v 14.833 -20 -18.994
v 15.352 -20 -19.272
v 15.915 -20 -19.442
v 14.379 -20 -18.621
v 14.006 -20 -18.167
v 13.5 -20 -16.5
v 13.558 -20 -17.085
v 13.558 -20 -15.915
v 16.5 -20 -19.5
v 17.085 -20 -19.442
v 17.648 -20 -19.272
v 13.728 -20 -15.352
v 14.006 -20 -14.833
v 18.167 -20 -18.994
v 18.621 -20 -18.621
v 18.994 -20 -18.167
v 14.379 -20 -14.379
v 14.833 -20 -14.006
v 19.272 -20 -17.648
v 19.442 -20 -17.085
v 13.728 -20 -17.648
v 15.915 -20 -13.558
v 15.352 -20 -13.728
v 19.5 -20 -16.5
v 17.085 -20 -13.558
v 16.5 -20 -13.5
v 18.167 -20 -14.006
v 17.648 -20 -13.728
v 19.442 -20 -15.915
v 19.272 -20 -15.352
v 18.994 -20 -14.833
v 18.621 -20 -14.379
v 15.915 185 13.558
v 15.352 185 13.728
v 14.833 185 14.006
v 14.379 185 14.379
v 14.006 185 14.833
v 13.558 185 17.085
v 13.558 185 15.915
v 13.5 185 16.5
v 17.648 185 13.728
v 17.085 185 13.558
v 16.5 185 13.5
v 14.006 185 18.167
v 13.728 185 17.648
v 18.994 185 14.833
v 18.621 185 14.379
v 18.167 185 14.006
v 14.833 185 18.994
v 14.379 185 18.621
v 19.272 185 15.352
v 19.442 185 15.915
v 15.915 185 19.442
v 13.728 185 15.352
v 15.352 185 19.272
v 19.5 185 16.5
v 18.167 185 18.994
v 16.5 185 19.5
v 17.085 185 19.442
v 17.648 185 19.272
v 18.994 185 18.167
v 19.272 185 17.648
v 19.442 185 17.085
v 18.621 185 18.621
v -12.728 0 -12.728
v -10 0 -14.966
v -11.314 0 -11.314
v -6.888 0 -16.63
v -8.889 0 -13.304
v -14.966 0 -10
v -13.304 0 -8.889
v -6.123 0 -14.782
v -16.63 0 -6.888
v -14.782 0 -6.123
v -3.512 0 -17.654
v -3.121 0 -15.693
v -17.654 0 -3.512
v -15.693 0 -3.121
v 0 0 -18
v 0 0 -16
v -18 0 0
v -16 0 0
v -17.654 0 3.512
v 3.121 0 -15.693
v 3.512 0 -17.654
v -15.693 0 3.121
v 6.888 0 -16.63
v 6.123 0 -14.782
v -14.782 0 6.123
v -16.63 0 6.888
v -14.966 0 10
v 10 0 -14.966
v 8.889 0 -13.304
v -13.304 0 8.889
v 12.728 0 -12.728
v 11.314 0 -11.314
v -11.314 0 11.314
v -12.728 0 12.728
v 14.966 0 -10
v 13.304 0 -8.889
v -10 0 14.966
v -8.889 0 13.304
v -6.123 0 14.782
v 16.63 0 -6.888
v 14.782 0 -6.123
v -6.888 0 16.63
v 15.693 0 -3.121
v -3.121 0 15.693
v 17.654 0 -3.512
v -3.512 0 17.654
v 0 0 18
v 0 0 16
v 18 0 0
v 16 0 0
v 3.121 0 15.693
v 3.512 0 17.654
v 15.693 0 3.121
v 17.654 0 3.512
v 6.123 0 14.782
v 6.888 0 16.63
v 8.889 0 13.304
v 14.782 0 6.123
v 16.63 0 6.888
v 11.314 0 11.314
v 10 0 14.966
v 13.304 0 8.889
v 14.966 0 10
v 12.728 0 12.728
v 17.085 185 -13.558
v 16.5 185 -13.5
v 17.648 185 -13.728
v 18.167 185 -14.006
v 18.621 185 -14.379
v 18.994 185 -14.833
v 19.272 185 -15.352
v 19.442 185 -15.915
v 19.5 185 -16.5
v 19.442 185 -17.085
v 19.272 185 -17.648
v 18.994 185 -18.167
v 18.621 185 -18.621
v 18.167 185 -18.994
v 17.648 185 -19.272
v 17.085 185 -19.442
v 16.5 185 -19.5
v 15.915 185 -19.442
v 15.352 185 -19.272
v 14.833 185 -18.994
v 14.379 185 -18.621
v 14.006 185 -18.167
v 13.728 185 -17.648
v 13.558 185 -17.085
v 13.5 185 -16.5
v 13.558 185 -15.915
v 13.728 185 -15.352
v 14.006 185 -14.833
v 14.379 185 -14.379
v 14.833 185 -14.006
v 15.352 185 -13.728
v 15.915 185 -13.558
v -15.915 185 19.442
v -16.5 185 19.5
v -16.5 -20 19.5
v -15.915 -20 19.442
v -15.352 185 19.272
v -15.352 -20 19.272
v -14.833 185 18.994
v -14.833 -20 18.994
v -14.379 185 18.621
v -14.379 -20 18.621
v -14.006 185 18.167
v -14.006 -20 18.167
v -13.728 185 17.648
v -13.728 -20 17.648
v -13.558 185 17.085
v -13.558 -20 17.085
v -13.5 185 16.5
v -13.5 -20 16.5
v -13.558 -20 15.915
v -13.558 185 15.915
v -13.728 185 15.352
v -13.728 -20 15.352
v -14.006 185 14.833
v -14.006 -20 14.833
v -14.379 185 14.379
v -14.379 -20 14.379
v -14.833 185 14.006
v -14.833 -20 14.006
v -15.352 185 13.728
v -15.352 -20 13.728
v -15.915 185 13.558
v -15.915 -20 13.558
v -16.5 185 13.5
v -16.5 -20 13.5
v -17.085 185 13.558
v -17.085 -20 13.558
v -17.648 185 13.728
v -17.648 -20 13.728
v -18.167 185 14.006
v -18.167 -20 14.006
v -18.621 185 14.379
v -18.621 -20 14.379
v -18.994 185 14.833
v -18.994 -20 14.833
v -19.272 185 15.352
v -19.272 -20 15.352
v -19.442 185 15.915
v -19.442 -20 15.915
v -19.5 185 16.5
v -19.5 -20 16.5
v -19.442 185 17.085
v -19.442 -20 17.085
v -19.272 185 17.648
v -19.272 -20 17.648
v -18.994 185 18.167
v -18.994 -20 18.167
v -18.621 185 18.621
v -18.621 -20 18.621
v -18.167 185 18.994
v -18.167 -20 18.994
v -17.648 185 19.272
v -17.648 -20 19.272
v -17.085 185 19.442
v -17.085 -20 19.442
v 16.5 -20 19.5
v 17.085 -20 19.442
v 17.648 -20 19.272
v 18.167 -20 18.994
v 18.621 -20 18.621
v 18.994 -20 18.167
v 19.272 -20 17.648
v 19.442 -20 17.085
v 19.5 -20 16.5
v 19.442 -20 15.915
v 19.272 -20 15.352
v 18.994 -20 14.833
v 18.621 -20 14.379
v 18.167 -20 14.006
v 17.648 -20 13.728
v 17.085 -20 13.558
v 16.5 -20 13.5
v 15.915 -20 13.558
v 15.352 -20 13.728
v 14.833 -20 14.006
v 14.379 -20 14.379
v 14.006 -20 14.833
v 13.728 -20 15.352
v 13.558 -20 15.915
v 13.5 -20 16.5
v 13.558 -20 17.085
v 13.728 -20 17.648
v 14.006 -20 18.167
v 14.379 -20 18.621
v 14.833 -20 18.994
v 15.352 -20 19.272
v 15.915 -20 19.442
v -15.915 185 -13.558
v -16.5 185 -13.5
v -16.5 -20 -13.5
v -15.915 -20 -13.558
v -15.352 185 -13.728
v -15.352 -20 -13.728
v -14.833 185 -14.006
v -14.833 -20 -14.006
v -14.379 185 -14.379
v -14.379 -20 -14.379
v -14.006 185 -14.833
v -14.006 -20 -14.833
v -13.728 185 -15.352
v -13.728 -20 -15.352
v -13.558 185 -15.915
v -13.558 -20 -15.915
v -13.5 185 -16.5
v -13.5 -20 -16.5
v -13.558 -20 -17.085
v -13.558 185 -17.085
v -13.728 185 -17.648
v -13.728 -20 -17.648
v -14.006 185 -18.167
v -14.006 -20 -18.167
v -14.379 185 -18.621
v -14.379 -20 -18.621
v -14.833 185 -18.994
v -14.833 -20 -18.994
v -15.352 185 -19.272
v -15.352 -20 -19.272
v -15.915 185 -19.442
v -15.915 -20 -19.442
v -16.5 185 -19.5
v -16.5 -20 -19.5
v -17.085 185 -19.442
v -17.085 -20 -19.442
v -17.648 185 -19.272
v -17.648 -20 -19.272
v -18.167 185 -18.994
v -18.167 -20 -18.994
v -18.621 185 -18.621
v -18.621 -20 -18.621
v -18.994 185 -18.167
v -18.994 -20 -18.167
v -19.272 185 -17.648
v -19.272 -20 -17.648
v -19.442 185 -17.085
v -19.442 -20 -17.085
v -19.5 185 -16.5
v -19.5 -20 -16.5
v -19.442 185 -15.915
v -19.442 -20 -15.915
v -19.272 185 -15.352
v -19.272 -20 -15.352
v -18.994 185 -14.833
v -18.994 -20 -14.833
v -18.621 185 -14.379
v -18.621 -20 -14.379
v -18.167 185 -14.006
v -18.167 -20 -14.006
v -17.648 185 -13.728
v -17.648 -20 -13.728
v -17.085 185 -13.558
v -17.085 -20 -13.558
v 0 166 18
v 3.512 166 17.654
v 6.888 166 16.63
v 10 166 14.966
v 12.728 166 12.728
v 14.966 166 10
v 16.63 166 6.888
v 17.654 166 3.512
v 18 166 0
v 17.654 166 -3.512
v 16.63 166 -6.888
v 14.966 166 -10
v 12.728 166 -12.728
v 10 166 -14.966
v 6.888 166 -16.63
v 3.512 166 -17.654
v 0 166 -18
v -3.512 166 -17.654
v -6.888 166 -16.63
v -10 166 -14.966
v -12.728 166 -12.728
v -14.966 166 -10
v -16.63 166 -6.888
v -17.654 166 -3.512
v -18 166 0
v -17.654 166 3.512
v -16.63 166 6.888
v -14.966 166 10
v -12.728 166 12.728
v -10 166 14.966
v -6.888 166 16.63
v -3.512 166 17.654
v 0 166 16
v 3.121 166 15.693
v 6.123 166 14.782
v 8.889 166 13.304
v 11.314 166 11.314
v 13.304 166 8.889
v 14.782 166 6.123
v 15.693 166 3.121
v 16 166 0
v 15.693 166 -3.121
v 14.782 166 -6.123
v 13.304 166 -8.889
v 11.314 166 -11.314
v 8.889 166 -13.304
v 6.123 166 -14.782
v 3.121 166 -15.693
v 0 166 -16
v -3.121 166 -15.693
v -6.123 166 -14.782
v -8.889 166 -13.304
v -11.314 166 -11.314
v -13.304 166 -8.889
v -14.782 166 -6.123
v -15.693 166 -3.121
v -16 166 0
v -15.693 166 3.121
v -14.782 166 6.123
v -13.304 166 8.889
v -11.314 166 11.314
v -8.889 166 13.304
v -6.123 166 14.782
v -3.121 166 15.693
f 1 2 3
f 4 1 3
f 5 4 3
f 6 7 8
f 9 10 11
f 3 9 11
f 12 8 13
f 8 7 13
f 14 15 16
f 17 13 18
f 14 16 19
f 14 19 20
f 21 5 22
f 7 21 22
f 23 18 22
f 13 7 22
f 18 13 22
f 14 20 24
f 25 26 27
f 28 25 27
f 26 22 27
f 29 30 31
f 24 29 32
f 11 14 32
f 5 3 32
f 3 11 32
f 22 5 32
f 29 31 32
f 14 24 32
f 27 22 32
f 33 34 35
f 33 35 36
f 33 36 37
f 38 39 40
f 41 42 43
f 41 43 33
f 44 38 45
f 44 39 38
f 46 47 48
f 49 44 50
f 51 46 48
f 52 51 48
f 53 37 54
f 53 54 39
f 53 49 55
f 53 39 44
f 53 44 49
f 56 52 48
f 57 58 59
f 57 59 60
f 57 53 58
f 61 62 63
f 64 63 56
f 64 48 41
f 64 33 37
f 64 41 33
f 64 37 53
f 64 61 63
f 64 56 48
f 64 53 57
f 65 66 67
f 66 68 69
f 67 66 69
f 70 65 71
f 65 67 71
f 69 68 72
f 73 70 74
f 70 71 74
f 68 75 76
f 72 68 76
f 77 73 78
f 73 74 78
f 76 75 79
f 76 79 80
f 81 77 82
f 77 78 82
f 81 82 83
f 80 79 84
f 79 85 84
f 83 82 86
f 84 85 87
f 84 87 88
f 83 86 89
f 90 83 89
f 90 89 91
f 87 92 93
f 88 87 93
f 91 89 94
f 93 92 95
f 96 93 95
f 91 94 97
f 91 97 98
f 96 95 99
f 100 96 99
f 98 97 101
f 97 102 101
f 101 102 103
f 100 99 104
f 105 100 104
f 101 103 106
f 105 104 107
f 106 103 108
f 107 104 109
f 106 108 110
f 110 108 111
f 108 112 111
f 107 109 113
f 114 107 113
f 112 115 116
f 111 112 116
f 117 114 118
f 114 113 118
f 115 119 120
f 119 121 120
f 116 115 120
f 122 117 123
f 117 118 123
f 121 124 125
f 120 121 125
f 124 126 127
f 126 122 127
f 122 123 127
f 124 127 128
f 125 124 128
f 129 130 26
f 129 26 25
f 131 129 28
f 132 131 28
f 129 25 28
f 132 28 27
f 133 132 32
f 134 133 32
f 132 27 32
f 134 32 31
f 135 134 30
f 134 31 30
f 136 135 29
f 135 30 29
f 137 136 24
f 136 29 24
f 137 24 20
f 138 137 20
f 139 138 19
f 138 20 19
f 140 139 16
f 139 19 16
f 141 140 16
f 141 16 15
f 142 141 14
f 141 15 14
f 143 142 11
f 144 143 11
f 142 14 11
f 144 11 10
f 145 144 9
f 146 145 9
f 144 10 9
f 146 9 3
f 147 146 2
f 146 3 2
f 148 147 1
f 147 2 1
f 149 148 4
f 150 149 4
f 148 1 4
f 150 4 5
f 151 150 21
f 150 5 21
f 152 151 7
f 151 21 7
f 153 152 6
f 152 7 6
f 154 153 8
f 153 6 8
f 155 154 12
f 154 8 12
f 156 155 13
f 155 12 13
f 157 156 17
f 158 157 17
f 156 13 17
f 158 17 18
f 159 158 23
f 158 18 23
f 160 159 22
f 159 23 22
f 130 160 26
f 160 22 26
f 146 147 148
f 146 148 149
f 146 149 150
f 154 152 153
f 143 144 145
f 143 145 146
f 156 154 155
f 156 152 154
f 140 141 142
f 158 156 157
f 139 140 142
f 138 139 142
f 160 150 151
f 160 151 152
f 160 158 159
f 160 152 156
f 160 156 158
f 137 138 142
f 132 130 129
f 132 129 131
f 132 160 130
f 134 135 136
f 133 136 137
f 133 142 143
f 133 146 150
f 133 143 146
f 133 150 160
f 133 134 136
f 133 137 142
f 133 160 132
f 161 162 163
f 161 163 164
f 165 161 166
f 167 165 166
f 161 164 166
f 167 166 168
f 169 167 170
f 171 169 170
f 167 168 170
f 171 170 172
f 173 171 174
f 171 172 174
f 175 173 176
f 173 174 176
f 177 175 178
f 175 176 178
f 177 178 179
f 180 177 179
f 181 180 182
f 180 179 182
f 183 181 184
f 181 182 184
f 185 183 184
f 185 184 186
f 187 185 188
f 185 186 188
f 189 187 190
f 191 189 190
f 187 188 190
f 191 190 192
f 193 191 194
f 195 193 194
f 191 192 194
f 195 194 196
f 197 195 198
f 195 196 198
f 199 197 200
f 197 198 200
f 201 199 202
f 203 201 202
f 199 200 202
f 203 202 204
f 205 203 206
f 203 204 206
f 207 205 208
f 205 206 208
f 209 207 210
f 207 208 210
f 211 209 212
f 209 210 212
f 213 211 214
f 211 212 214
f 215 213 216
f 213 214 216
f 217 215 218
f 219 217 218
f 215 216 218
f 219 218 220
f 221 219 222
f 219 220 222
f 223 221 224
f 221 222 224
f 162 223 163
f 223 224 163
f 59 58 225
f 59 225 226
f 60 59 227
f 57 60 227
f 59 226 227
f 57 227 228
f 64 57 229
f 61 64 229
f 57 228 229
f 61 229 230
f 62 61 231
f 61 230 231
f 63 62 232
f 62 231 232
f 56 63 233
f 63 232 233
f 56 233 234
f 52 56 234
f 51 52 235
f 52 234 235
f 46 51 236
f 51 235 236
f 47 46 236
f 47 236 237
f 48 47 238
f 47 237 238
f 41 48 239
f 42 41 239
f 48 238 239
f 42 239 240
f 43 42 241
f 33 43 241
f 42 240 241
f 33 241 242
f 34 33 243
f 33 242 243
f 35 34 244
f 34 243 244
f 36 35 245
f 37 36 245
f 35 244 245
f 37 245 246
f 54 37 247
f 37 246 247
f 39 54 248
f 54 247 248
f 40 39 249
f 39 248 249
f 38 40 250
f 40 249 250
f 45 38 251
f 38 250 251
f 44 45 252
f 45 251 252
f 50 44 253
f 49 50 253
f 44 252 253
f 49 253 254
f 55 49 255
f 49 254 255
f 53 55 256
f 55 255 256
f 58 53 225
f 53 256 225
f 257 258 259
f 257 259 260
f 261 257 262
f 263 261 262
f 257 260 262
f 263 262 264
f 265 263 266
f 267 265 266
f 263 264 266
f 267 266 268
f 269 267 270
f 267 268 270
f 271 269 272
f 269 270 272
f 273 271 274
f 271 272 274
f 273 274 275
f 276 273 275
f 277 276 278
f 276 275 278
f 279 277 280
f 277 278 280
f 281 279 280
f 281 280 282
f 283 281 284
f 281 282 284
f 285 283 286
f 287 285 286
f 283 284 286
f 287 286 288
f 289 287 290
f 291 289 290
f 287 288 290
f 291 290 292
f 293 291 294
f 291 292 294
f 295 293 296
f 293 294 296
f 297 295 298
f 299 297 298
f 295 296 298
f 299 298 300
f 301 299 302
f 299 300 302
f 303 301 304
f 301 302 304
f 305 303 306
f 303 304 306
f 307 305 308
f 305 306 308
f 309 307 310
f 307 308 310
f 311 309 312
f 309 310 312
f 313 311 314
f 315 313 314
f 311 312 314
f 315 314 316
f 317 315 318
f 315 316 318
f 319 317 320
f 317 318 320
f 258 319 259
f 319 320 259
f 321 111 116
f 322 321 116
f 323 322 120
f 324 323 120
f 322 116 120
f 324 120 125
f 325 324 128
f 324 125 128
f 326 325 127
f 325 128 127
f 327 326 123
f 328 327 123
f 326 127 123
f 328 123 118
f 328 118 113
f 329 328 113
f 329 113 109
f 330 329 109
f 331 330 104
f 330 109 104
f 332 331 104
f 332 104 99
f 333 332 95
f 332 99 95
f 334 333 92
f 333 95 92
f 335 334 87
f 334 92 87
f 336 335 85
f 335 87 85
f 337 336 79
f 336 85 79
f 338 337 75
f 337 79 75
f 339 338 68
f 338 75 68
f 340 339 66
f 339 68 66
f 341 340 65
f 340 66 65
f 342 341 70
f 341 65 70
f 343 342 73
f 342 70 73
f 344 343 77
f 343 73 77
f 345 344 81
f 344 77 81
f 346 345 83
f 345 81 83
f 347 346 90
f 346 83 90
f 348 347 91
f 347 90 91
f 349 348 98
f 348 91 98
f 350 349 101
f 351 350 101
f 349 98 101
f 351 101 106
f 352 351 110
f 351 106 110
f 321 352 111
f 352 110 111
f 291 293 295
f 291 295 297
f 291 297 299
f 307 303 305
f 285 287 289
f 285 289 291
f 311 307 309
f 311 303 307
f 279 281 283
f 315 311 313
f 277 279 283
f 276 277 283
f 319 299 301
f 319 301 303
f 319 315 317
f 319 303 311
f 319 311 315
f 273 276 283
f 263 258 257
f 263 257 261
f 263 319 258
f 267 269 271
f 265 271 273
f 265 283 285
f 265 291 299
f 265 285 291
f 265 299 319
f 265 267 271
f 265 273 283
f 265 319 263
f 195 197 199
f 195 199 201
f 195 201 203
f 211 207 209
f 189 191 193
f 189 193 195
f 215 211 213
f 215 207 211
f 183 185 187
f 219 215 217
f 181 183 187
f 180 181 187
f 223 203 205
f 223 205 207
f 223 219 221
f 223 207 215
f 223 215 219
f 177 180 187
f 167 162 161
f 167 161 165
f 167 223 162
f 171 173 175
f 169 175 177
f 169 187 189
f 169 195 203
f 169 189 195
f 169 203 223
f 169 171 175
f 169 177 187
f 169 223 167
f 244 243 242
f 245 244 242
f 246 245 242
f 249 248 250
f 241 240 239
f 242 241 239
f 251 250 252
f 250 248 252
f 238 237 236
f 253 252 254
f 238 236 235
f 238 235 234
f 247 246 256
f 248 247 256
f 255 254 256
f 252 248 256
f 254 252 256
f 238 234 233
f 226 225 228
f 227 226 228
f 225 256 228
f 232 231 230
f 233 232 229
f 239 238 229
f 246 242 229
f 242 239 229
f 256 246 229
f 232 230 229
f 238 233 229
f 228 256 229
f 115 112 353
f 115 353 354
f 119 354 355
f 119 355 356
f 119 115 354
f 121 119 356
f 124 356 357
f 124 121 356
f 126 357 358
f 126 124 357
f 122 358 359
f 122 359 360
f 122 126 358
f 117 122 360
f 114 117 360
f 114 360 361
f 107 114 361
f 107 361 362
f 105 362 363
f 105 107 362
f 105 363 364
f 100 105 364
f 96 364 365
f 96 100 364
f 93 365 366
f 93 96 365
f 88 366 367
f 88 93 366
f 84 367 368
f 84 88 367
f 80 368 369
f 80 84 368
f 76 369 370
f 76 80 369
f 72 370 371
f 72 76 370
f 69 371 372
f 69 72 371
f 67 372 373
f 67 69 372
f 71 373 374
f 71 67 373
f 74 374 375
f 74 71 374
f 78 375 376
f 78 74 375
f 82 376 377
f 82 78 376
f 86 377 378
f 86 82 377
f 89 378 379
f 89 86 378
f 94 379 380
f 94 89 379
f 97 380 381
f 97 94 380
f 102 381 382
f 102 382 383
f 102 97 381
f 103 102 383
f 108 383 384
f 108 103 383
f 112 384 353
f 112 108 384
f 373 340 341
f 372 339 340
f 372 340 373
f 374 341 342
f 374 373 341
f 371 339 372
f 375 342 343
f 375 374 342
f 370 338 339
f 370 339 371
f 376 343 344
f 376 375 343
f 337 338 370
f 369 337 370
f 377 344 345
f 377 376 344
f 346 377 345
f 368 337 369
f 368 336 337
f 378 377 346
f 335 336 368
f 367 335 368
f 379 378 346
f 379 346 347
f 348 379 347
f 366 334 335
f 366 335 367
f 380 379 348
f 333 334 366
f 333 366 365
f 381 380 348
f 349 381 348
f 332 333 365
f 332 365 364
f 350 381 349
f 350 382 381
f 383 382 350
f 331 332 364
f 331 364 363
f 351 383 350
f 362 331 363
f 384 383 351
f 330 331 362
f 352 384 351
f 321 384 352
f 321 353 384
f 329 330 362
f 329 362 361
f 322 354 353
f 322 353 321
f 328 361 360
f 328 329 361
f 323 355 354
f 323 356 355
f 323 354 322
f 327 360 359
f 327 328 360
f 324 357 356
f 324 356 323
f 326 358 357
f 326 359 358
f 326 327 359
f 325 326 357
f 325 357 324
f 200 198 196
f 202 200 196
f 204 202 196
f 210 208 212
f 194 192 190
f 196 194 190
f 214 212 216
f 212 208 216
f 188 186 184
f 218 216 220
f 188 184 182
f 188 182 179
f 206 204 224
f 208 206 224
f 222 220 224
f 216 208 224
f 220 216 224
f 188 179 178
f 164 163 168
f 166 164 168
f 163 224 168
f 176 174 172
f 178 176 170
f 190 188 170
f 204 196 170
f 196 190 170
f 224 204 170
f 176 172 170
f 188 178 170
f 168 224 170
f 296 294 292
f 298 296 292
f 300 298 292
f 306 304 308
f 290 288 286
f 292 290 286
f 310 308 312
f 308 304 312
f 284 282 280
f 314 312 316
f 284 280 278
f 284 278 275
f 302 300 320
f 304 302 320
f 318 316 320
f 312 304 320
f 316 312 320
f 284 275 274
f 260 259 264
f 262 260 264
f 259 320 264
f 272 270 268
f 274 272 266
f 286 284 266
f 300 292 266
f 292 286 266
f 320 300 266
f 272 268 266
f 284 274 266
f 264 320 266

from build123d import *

# Parameters (mm, degrees)
SKETCH1_R                  = 18
SKETCH1_R_2                = 16
BOSS_EXTRUDE1_DEPTH        = 166
BOSS_EXTRUDE2_DEPTH        = 185
BOSS_EXTRUDE2_DEPTH_BACK   = 20
SKETCH2_R                  = 3
BOSS_EXTRUDE2_2_DEPTH      = 185
BOSS_EXTRUDE2_2_DEPTH_BACK = 20
BOSS_EXTRUDE2_3_DEPTH      = 185
BOSS_EXTRUDE2_3_DEPTH_BACK = 20
BOSS_EXTRUDE2_4_DEPTH      = 185
BOSS_EXTRUDE2_4_DEPTH_BACK = 20


with BuildPart() as part:
    # Sketch1 → Boss-Extrude1 (new body)
    with BuildSketch(Plane(origin=(0, 0, 0), x_dir=(1, 0, 0), z_dir=(0, 1, 0))):
        with Locations(Location((0, 0, 0), (0, 0, 270))):
            Circle(SKETCH1_R)
        with Locations(Location((0, 0, 0), (0, 0, 270))):
            Circle(SKETCH1_R_2, mode=Mode.SUBTRACT)
    extrude(amount=BOSS_EXTRUDE1_DEPTH)


with BuildPart() as body_2:
    # Sketch2 → Boss-Extrude2 (new, two sides: drawn at the far end of the back side and taken through both)
    with BuildSketch(Plane(origin=(0, 0, 0), x_dir=(1, 0, 0), z_dir=(0, 1, 0)).offset(-BOSS_EXTRUDE2_DEPTH_BACK)):
        with Locations(Location((-16.5, 16.5, 0), (0, 0, 270))):
            Circle(SKETCH2_R)
    extrude(amount=BOSS_EXTRUDE2_DEPTH + BOSS_EXTRUDE2_DEPTH_BACK)


with BuildPart() as body_3:
    # Sketch2 → Boss-Extrude2 2 (new, two sides: drawn at the far end of the back side and taken through both)
    with BuildSketch(Plane(origin=(0, 0, 0), x_dir=(1, 0, 0), z_dir=(0, 1, 0)).offset(-BOSS_EXTRUDE2_2_DEPTH_BACK)):
        with Locations(Location((16.5, 16.5, 0), (0, 0, 270))):
            Circle(SKETCH2_R)
    extrude(amount=BOSS_EXTRUDE2_2_DEPTH + BOSS_EXTRUDE2_2_DEPTH_BACK)


with BuildPart() as body_4:
    # Sketch2 → Boss-Extrude2 3 (new, two sides: drawn at the far end of the back side and taken through both)
    with BuildSketch(Plane(origin=(0, 0, 0), x_dir=(1, 0, 0), z_dir=(0, 1, 0)).offset(-BOSS_EXTRUDE2_3_DEPTH_BACK)):
        with Locations(Location((16.5, -16.5, 0), (0, 0, 270))):
            Circle(SKETCH2_R)
    extrude(amount=BOSS_EXTRUDE2_3_DEPTH + BOSS_EXTRUDE2_3_DEPTH_BACK)


with BuildPart() as body_5:
    # Sketch2 → Boss-Extrude2 4 (new, two sides: drawn at the far end of the back side and taken through both)
    with BuildSketch(Plane(origin=(0, 0, 0), x_dir=(1, 0, 0), z_dir=(0, 1, 0)).offset(-BOSS_EXTRUDE2_4_DEPTH_BACK)):
        with Locations(Location((-16.5, -16.5, 0), (0, 0, 270))):
            Circle(SKETCH2_R)
    extrude(amount=BOSS_EXTRUDE2_4_DEPTH + BOSS_EXTRUDE2_4_DEPTH_BACK)


solid = Compound([part.part, body_2.part, body_3.part, body_4.part, body_5.part])
